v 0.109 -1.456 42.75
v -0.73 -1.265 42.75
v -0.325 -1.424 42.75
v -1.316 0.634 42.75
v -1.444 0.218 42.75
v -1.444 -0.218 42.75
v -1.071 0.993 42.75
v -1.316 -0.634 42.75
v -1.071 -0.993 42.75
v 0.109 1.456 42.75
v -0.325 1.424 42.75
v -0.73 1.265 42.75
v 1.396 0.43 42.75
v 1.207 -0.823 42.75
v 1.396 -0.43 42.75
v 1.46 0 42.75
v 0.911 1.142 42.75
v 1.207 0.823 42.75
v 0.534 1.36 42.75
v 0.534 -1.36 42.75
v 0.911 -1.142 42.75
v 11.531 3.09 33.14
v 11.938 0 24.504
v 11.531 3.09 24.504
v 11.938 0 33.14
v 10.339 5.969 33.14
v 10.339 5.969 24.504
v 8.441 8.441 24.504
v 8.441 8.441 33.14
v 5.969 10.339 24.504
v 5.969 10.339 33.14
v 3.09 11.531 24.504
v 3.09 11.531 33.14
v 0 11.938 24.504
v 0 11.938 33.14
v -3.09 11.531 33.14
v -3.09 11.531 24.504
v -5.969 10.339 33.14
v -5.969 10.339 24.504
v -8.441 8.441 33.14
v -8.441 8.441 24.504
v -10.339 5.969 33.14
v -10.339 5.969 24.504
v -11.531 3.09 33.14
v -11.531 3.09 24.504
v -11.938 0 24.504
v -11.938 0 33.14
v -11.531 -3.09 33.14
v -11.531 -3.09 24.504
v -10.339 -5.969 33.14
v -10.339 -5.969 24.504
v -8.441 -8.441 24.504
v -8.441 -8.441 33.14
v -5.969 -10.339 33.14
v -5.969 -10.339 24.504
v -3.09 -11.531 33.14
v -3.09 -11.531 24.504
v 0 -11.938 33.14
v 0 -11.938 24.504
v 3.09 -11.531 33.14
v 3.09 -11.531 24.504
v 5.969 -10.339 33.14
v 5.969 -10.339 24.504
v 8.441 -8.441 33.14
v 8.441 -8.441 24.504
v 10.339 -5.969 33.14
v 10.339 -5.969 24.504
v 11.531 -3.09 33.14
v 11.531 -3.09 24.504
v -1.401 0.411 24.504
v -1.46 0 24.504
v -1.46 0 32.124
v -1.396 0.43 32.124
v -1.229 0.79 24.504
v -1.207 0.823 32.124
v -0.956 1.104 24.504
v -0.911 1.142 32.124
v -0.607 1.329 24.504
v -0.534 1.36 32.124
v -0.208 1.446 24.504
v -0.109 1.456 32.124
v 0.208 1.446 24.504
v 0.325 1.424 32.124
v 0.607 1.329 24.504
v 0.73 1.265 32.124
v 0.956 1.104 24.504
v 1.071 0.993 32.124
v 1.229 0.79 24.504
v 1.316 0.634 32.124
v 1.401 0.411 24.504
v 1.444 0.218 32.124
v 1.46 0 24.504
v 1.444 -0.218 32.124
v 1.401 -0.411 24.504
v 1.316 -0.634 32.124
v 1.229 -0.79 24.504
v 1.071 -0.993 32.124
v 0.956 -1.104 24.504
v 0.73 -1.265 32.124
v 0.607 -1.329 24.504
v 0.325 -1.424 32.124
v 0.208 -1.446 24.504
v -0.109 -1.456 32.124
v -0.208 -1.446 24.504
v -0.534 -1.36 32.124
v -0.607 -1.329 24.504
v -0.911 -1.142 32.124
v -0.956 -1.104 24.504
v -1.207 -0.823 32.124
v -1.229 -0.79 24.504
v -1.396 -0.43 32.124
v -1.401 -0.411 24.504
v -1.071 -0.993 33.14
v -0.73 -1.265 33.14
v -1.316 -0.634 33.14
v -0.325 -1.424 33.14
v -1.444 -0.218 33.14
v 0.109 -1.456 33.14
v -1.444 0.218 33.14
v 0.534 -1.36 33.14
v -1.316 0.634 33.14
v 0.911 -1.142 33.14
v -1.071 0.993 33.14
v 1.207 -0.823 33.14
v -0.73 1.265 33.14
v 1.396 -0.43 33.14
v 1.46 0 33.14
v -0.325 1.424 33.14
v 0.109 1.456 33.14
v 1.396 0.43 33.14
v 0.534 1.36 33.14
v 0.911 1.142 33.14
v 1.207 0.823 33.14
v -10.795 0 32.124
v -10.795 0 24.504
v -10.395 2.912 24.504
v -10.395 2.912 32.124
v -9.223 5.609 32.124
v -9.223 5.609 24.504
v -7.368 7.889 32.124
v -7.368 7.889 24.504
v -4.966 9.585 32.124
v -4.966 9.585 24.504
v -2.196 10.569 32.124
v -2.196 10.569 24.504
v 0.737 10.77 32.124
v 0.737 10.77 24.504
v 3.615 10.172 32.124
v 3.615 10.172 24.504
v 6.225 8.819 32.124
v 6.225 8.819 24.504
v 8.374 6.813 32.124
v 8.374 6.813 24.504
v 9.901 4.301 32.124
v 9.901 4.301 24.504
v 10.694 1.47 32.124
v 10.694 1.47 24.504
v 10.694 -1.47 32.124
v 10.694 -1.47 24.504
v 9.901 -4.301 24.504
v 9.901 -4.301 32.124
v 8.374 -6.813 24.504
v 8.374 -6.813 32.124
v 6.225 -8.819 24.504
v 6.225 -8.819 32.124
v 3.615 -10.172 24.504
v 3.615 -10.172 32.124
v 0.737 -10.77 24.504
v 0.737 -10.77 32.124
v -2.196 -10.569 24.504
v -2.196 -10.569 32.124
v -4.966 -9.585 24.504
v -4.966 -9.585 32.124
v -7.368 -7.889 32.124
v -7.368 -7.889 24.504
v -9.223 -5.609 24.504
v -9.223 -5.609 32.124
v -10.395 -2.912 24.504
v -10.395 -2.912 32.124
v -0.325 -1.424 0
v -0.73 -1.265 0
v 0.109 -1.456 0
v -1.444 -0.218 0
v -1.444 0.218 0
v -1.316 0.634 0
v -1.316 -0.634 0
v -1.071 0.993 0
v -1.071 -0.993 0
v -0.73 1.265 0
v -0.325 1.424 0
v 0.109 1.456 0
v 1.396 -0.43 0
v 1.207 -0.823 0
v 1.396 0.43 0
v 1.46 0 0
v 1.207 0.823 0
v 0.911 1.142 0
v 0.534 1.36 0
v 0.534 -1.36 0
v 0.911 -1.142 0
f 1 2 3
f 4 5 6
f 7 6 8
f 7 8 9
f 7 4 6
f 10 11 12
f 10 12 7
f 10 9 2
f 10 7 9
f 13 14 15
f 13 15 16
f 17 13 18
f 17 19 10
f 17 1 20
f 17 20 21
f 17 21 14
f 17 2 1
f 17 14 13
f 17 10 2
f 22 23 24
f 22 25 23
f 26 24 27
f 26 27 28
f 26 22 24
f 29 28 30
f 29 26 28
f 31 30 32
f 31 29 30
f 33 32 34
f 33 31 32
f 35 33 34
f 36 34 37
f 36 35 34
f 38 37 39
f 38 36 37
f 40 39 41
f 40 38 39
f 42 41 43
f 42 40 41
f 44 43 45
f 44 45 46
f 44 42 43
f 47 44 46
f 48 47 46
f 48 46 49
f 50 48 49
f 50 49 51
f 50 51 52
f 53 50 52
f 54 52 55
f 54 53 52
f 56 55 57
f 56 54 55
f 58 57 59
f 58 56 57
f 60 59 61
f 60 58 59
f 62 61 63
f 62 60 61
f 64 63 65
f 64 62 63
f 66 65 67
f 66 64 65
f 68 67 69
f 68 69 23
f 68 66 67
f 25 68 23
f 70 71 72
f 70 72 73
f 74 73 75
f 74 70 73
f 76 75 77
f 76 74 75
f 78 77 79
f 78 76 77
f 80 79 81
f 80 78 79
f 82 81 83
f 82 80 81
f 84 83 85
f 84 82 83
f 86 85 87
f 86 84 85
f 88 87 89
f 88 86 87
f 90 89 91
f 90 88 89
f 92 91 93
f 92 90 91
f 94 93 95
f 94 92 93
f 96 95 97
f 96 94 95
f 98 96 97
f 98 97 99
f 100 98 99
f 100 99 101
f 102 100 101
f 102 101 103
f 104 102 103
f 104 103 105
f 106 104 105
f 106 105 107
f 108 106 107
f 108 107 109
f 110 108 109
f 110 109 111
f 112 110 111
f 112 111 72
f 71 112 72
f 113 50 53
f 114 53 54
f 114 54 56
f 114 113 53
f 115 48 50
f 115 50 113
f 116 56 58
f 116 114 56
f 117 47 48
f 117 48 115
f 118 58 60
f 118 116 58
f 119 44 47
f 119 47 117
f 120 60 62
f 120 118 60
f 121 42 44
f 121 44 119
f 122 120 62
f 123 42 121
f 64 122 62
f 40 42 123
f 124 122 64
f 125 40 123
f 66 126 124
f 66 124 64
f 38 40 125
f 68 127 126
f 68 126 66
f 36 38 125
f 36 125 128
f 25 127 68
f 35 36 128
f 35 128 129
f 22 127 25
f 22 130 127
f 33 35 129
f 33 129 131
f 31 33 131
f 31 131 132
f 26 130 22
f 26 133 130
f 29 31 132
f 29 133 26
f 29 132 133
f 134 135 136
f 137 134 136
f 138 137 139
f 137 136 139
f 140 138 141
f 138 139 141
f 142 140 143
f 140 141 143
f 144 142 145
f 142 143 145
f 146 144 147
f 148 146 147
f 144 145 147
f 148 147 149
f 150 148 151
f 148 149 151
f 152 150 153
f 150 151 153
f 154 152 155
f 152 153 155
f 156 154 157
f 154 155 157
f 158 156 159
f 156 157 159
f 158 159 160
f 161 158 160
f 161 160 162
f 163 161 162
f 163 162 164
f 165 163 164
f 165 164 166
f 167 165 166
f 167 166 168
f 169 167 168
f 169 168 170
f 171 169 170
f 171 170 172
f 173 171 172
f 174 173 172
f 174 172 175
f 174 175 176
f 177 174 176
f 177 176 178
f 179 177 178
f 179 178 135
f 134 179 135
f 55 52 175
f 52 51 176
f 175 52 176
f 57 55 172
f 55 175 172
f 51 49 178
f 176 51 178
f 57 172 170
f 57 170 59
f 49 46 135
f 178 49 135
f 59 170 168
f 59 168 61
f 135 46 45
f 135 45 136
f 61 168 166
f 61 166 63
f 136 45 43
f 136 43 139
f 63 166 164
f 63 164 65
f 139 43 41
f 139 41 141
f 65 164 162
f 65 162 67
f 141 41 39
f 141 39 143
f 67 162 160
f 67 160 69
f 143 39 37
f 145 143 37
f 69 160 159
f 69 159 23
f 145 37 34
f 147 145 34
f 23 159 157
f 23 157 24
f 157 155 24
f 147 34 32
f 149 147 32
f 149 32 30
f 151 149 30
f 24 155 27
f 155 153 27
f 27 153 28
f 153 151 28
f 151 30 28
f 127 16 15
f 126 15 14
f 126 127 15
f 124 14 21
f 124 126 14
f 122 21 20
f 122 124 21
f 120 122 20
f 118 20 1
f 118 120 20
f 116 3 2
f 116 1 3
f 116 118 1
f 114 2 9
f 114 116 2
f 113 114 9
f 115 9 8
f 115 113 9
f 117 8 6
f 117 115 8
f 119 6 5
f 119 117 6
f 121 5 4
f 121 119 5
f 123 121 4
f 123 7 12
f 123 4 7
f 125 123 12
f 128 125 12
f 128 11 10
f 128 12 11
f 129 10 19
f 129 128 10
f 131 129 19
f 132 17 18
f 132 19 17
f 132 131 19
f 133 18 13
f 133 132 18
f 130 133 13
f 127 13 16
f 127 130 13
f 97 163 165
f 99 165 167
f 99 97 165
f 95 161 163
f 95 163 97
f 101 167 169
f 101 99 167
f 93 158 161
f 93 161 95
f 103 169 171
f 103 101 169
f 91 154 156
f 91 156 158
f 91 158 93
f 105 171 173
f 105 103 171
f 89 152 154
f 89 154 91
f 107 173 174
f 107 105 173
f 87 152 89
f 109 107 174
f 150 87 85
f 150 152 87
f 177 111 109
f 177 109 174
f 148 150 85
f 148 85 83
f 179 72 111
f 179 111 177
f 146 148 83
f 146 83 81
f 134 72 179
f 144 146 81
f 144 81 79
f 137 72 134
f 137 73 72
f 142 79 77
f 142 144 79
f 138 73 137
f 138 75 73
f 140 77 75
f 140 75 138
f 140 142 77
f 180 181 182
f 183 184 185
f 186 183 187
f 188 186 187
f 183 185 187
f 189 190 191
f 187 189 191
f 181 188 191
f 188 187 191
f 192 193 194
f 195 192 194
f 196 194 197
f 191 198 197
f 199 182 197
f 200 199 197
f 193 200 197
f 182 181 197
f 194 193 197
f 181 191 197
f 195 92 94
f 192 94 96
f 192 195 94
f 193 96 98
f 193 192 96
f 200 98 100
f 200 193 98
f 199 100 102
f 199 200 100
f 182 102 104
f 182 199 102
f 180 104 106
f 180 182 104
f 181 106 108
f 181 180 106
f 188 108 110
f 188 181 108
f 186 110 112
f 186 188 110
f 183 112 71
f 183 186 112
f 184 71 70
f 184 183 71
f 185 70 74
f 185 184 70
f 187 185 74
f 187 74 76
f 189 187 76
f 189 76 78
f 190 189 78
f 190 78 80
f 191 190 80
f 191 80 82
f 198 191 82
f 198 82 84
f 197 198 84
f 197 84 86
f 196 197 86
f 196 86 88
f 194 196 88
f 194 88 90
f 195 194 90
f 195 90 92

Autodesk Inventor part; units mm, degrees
ref_plane "YZ Plane" through (0, 0, 0) normal (1, 0, 0) x (0, 1, 0)
ref_plane "XZ Plane" through (0, 0, 0) normal (0, 1, 0) x (-1, 0, 0)
sketch "Sketch1" plane through (0, 0, 0) normal (0, 0, 1) x (1, 0, 0)
  circle A0 centre (0, 0) radius 1.4605
  dimension "d0" = 2.921
extrude "Extrusion1" add sketch "Sketch1" along normal blind 42.75
ref_plane "Work Plane1" through (0, 0, 33.14) normal (0, 0, 1) x (1, 0, 0)
sketch "Sketch2" plane through (0, 0, 33.14) normal (0, 0, 1) x (1, 0, 0)
  circle A0 centre (0, 0) radius 11.938
  dimension "d5" = 23.876
extrude "Extrusion2" add sketch "Sketch2" against normal blind 8.636
sketch "Sketch3" plane through (0, 0, 24.504) normal (0, 0, -1) x (-1, 0, 0)
  circle A0 centre (0, 0) radius 1.4605 projected
  circle A1 centre (0, 0) radius 10.795
  dimension "d9" = 21.59
extrude "Extrusion3" cut sketch "Sketch3" against normal blind 7.62
properties part number "can"
